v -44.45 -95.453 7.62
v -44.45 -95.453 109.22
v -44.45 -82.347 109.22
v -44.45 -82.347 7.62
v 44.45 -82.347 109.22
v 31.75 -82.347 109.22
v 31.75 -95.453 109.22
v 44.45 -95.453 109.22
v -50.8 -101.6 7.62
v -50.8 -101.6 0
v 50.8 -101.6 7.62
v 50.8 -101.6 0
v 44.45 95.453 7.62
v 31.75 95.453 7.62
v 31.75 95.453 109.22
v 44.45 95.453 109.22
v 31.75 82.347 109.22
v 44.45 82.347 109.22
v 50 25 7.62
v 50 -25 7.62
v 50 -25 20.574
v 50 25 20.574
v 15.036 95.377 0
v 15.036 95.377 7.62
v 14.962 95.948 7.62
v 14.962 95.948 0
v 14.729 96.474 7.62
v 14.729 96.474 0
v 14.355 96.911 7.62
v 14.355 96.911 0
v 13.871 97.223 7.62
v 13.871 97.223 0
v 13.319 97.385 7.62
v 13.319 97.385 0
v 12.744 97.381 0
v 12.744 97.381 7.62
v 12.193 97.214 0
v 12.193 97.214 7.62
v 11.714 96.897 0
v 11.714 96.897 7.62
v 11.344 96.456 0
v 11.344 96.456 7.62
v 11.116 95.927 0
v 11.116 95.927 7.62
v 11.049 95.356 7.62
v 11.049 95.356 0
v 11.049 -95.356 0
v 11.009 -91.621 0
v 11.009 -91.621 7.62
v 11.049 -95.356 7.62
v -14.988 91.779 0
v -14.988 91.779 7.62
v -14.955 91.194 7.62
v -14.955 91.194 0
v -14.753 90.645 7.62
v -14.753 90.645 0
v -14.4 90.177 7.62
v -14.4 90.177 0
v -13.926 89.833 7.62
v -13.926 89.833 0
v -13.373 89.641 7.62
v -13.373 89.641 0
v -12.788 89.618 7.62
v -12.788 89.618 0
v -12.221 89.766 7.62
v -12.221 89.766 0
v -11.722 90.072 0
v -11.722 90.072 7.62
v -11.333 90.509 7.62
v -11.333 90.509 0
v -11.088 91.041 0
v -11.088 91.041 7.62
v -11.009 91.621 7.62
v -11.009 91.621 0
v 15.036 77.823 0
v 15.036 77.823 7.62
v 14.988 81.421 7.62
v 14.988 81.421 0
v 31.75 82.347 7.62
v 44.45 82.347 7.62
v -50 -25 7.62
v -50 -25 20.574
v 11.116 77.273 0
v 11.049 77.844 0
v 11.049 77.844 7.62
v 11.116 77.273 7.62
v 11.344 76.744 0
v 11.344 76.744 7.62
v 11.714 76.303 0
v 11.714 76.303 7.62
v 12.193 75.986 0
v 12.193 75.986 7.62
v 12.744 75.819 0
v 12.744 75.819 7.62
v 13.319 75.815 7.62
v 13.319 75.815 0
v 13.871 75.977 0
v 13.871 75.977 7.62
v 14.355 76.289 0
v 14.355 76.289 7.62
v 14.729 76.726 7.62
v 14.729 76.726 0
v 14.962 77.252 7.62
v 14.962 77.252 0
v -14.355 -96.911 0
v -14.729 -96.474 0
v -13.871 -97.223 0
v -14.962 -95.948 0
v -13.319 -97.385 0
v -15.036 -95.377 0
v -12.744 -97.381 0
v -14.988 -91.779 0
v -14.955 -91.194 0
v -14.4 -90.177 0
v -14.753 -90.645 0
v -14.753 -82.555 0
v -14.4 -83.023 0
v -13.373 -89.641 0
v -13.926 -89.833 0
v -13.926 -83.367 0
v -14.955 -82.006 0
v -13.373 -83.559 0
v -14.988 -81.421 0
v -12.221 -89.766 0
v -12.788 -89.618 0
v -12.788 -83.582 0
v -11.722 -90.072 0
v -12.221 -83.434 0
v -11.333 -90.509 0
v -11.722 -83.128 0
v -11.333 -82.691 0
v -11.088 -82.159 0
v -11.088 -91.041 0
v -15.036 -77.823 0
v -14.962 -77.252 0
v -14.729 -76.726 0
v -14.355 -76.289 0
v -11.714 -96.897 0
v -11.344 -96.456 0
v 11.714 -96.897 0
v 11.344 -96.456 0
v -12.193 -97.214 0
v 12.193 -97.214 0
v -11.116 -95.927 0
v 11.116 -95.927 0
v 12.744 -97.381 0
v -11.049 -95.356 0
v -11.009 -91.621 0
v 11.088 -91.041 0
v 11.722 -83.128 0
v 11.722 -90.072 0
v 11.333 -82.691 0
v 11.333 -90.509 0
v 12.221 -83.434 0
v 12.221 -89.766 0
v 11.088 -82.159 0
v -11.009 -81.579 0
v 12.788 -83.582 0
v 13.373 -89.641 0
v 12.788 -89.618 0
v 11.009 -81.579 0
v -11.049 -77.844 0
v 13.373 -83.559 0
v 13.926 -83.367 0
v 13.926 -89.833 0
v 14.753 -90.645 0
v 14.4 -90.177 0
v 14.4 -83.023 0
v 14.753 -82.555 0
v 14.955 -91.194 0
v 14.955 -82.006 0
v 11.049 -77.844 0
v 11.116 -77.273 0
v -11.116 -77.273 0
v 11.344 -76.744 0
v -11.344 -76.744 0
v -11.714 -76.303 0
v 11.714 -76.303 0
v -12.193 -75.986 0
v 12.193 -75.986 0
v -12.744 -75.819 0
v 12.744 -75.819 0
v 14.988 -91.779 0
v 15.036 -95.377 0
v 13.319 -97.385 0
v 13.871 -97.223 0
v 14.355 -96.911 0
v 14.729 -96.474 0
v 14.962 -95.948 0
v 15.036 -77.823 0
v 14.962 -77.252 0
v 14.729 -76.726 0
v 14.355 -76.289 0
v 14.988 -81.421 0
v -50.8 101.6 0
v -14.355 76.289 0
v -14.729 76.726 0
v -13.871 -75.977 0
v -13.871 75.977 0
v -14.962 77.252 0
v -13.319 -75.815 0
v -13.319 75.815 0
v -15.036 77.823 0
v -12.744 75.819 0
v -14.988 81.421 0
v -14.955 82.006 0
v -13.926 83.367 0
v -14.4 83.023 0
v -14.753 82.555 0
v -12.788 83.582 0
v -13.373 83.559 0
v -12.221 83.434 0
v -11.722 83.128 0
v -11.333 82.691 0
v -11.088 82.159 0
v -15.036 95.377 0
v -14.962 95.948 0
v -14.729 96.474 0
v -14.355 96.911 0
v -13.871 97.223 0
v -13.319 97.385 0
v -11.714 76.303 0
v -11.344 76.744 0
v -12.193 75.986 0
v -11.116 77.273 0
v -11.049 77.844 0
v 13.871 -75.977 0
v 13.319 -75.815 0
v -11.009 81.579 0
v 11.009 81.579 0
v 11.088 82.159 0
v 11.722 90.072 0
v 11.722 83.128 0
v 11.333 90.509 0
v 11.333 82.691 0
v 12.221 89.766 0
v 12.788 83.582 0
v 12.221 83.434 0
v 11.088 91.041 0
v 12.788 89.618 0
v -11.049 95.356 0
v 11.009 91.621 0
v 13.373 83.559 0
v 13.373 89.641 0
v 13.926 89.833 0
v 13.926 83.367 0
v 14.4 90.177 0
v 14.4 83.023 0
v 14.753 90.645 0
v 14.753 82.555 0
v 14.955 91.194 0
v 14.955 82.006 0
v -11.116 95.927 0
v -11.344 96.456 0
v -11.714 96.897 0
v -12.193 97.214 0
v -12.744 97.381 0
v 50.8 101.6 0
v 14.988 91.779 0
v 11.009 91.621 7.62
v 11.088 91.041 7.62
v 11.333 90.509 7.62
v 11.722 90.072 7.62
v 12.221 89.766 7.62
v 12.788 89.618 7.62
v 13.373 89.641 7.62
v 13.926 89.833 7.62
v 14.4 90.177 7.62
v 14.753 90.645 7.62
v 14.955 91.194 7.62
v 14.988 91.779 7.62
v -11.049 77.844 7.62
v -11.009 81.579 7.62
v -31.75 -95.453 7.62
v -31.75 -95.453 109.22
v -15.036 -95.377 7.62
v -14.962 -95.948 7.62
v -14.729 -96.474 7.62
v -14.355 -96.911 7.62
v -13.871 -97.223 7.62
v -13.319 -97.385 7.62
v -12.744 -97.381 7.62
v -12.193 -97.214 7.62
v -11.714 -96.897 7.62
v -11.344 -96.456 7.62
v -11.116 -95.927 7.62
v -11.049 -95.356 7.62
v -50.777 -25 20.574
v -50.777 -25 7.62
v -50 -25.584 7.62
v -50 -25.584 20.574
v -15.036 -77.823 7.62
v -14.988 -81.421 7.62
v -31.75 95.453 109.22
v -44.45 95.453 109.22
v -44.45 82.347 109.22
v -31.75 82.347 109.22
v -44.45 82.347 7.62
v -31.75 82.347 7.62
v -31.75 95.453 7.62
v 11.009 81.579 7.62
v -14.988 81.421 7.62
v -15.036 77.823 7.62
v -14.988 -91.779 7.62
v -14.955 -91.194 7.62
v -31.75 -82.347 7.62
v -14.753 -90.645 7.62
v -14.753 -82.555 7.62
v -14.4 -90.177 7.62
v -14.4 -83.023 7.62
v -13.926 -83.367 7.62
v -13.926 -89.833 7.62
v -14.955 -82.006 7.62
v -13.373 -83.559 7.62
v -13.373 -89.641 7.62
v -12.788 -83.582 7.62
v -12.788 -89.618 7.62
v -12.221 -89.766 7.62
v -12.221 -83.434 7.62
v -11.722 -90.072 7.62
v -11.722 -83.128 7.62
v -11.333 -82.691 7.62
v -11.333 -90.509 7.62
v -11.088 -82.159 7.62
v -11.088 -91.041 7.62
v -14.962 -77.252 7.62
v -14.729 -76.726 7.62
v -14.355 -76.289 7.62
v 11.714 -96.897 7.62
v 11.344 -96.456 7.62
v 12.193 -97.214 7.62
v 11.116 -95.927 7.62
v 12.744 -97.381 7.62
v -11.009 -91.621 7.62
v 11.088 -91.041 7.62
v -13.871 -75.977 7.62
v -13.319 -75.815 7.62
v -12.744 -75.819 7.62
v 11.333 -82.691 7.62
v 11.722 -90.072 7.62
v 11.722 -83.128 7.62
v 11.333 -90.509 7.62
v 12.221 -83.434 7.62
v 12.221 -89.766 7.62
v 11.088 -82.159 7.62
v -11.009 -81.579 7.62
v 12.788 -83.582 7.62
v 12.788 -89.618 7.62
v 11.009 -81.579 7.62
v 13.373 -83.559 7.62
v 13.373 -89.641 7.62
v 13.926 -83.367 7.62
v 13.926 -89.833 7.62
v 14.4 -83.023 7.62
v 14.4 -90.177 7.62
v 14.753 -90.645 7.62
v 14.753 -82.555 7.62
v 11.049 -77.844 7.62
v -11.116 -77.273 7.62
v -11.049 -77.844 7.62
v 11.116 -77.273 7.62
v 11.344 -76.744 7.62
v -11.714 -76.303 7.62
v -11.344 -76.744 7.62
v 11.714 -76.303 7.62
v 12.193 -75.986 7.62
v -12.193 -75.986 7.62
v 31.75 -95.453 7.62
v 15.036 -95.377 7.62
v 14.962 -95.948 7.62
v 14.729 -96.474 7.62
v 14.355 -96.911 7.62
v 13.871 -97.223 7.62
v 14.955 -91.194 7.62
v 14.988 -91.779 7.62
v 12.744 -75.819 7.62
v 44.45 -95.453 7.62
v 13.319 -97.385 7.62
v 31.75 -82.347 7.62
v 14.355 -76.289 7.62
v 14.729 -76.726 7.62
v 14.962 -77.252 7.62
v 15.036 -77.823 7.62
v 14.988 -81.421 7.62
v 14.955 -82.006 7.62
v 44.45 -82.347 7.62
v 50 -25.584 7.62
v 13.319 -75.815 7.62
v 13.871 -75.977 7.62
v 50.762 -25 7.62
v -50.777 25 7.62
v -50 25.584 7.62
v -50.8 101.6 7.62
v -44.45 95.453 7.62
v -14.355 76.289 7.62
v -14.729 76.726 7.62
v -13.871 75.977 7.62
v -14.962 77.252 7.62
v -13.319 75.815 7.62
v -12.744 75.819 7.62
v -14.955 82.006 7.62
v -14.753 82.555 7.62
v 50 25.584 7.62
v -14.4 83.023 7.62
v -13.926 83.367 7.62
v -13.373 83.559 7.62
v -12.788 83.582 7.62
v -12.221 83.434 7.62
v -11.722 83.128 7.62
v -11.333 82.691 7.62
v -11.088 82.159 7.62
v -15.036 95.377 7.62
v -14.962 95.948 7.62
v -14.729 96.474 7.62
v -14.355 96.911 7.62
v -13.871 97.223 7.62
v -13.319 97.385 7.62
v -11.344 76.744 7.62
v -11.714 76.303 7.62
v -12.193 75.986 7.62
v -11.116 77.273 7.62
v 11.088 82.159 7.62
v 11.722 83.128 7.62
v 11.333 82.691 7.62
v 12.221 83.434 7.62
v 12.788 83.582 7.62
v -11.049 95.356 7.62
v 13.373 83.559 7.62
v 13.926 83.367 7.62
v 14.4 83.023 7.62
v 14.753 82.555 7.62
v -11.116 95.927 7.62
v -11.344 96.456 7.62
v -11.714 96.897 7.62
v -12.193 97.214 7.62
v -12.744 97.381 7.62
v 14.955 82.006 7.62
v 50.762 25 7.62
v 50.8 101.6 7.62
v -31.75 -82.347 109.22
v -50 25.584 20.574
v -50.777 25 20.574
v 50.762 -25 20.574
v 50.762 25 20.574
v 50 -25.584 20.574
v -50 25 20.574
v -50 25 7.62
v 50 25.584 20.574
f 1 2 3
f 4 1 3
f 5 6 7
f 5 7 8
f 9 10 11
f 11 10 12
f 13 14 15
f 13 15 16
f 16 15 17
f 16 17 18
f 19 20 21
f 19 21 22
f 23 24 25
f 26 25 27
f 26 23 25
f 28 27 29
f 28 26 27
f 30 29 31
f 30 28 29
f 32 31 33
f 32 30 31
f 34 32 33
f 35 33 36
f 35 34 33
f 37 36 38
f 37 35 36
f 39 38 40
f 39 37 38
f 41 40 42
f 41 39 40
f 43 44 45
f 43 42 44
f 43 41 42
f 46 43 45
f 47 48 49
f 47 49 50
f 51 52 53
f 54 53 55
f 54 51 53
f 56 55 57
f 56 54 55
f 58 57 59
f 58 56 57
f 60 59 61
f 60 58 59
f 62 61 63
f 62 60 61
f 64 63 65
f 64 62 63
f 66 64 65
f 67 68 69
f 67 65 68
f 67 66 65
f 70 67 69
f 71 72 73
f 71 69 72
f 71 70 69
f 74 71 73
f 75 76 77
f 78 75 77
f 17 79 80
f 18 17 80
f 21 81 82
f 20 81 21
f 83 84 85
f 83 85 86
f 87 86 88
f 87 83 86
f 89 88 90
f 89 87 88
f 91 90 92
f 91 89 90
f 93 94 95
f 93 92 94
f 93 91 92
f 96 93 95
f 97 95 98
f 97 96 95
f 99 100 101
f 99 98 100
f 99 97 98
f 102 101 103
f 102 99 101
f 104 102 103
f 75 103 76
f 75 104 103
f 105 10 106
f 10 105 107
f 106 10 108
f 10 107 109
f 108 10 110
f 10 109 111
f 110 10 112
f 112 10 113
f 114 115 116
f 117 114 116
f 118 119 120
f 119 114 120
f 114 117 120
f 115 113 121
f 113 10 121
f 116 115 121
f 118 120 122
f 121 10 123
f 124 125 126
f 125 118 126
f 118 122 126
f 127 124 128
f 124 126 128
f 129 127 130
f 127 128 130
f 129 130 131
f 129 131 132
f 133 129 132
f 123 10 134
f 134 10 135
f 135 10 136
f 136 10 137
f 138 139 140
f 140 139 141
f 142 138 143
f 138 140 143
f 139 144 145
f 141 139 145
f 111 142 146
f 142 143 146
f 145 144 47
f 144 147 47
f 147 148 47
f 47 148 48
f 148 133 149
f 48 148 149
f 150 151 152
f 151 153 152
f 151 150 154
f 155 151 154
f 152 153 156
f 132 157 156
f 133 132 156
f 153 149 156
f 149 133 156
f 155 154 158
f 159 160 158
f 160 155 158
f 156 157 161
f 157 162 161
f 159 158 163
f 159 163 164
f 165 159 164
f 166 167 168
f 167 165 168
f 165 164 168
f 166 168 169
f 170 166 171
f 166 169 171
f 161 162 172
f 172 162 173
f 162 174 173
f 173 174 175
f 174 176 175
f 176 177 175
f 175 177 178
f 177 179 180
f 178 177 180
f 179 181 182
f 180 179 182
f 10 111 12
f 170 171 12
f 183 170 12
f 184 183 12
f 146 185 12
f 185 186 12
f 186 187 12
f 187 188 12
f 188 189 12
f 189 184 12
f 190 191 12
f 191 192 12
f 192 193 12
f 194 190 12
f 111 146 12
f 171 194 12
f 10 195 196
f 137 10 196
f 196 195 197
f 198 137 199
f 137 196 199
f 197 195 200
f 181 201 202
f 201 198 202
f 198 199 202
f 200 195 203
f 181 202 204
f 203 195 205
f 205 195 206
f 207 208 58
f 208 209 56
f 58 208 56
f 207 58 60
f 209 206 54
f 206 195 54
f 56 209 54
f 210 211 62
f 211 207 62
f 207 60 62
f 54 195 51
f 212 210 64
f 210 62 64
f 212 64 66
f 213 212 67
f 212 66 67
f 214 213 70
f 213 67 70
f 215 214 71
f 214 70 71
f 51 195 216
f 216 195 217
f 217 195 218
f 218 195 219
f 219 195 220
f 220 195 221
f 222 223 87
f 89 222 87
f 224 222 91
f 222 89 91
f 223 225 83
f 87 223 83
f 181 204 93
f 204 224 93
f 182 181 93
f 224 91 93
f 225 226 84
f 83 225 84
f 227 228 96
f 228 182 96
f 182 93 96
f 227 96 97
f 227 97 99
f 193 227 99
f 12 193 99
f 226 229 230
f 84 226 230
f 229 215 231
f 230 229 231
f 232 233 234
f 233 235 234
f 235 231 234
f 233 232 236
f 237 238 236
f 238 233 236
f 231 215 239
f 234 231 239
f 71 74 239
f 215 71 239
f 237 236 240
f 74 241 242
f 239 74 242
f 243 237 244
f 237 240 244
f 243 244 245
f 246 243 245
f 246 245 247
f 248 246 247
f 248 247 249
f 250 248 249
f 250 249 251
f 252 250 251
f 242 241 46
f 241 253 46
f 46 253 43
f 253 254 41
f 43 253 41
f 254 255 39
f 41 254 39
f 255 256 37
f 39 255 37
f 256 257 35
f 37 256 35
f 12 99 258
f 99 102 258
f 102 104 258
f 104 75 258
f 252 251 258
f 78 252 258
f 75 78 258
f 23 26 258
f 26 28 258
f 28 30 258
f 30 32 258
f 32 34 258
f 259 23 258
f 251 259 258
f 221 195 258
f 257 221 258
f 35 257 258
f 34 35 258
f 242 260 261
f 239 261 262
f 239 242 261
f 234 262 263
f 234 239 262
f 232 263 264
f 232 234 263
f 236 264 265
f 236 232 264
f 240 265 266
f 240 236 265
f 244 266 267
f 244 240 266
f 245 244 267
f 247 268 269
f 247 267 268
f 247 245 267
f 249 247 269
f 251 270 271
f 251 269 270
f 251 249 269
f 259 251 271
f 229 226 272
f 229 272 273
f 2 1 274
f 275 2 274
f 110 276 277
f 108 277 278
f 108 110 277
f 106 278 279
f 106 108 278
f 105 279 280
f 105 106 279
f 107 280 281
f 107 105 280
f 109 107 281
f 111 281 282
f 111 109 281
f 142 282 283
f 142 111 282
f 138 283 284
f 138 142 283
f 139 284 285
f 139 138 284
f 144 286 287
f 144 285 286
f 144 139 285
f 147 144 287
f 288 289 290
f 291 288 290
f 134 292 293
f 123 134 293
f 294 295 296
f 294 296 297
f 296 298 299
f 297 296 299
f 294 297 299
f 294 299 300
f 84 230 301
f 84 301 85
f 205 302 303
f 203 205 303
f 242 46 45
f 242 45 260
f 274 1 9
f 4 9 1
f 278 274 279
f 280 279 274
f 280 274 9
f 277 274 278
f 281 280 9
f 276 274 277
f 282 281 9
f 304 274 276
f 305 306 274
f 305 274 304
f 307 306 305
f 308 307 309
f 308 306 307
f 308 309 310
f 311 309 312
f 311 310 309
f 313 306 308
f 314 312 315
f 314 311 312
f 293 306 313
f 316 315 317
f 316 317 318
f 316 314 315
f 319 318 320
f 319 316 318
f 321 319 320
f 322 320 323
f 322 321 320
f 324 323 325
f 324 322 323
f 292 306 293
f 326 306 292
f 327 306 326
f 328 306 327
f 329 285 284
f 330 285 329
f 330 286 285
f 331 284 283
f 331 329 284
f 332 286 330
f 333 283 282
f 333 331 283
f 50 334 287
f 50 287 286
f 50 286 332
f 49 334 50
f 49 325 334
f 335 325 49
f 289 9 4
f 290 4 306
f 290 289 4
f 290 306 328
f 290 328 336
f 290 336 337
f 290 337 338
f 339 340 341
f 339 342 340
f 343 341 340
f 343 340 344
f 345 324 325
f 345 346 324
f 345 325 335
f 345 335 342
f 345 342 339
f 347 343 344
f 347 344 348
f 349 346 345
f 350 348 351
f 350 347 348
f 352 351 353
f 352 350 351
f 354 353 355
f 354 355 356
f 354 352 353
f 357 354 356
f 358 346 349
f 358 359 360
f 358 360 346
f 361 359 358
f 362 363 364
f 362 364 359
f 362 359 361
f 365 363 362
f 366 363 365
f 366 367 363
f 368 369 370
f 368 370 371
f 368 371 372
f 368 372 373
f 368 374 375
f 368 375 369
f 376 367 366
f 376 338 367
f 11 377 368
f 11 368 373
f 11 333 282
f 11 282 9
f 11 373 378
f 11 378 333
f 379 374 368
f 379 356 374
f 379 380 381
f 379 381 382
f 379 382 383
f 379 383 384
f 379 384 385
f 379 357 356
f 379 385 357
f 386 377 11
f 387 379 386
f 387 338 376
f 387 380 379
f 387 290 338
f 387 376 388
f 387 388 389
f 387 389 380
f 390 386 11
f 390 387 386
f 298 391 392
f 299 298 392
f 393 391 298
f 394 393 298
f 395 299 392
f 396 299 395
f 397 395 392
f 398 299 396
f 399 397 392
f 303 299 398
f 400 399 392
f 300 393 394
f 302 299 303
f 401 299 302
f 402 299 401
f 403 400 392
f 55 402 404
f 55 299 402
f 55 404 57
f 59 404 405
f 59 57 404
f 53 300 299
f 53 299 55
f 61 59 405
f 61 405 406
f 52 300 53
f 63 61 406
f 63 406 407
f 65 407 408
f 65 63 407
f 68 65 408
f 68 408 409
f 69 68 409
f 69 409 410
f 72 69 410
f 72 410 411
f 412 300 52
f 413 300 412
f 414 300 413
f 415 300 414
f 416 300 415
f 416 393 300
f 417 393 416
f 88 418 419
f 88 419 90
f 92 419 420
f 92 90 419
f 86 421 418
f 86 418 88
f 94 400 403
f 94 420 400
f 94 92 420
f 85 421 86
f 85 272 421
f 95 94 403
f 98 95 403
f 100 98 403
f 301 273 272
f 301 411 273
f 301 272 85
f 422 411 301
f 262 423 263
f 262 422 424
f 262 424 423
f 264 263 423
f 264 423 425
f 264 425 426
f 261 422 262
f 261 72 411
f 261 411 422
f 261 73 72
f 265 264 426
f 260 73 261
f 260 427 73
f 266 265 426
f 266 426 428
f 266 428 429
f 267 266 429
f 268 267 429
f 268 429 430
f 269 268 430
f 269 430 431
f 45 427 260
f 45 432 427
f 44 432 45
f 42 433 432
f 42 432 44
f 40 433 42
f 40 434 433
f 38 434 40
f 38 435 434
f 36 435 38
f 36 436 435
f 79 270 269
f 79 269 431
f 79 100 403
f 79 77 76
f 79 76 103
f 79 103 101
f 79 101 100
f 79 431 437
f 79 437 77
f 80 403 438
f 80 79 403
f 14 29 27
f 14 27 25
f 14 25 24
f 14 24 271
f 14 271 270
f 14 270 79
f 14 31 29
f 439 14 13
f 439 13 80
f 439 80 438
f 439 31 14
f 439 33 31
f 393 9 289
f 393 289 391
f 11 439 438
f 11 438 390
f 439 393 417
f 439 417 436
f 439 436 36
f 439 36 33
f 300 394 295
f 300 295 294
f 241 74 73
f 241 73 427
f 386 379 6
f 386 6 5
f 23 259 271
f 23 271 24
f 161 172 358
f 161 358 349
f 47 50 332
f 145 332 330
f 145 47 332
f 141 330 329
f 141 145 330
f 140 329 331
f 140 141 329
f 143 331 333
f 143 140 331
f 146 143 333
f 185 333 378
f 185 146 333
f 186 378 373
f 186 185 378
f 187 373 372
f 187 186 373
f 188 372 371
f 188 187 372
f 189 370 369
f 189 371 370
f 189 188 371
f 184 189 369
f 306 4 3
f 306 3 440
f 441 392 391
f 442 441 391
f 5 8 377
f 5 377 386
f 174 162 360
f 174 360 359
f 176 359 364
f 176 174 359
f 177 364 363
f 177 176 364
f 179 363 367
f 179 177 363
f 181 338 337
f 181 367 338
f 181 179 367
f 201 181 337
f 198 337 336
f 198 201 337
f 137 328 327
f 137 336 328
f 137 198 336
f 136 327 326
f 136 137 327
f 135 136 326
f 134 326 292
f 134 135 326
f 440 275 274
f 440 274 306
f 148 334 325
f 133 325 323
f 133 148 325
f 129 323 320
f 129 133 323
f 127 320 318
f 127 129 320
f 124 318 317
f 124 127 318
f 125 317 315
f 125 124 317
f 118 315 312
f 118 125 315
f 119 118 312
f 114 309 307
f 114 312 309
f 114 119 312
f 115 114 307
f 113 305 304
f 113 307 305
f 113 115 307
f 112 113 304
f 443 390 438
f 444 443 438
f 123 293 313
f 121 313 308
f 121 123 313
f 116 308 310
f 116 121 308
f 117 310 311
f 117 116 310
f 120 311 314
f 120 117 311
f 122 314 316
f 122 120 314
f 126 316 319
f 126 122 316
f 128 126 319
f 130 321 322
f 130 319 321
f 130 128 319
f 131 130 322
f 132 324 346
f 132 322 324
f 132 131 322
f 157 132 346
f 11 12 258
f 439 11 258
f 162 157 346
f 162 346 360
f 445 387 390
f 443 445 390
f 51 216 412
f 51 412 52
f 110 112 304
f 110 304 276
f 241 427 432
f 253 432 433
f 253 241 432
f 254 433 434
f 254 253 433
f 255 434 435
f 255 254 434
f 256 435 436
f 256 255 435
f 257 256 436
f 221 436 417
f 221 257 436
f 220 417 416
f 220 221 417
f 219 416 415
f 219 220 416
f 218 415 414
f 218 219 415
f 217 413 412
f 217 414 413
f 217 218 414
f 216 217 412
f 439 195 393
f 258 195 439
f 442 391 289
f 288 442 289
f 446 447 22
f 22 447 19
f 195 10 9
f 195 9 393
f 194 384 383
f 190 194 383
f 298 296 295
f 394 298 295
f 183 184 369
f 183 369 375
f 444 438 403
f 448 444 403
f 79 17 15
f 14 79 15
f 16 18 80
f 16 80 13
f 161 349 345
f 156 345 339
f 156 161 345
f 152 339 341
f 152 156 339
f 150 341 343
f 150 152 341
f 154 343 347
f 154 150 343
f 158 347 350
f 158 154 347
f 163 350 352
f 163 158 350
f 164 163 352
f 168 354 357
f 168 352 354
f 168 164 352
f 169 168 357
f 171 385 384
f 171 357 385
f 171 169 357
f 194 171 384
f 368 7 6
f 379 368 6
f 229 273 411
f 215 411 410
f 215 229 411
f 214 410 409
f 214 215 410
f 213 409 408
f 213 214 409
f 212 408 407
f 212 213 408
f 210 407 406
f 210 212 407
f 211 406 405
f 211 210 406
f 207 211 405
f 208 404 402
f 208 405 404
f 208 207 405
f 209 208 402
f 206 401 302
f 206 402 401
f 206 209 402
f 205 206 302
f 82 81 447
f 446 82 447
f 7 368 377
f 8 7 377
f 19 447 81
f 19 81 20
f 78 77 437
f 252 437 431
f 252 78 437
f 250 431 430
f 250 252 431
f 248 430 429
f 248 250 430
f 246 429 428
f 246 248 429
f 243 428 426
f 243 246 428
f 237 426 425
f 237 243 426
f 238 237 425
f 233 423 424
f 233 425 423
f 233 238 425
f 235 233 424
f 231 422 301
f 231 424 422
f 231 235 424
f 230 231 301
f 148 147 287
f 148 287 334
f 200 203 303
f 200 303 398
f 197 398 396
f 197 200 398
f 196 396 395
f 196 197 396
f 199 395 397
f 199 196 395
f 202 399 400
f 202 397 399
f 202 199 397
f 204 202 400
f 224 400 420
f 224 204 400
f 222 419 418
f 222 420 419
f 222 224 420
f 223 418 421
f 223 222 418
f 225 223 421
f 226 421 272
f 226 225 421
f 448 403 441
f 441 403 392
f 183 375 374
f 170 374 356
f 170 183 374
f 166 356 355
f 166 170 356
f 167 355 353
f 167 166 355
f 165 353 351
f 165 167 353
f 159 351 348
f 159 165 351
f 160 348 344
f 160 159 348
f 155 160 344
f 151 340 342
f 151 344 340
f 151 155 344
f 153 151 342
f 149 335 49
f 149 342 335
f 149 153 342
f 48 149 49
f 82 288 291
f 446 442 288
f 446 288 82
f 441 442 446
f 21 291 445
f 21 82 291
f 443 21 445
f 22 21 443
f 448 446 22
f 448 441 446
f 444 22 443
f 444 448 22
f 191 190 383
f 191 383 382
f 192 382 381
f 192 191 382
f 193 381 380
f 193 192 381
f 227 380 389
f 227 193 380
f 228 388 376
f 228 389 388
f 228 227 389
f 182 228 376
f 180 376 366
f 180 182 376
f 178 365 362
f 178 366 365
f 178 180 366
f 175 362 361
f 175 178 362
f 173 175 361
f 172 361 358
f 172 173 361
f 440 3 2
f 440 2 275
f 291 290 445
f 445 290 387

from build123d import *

# Parameters (mm, degrees)
F0_W     = 101.6
F0_H     = 203.2
F1_DEPTH = 7.62
F3_DEPTH = 25.4
F4_W     = 12.7
F4_H     = 13.10565
F5_DEPTH = 101.6
F6_W     = 100
F6_H     = 50
F7_DEPTH = 12.954


with BuildPart() as f1:
    # F0 (on Top) → F1 (new body)
    with BuildSketch(Plane.XY):
        Rectangle(F0_W, F0_H)
    extrude(amount=F1_DEPTH)

    # F2 (on Top) → F3 (cut)
    with BuildSketch(Plane.XY):
        with BuildLine():
            Line((-15.035691, -77.822713), (-14.988321, -81.421245))
            ThreePointArc((-14.988321, -81.421245), (-13.081192, -83.592345), (-11.008666, -81.578528))
            Line((-11.008666, -81.578528), (-11.048887, -77.843856))
            ThreePointArc((-11.048887, -77.843856), (-13.031485, -75.796128), (-15.035691, -77.822713))
        make_face()
        with BuildLine():
            ThreePointArc((-15.035691, -95.377287), (-13.031485, -97.403872), (-11.048887, -95.356144))
            Line((-11.048887, -95.356144), (-11.008666, -91.621472))
            ThreePointArc((-11.008666, -91.621472), (-13.081192, -89.607655), (-14.988321, -91.778755))
            Line((-14.988321, -91.778755), (-15.035691, -95.377287))
        make_face()
        with BuildLine():
            ThreePointArc((15.035691, -77.822713), (13.031485, -75.796128), (11.048887, -77.843856))
            Line((11.048887, -77.843856), (11.008666, -81.578528))
            ThreePointArc((11.008666, -81.578528), (13.081192, -83.592345), (14.988321, -81.421245))
            Line((14.988321, -81.421245), (15.035691, -77.822713))
        make_face()
        with BuildLine():
            Line((11.008666, -91.621472), (11.048887, -95.356144))
            ThreePointArc((11.048887, -95.356144), (13.031485, -97.403872), (15.035691, -95.377287))
            Line((15.035691, -95.377287), (14.988321, -91.778755))
            ThreePointArc((14.988321, -91.778755), (13.081192, -89.607655), (11.008666, -91.621472))
        make_face()
        with BuildLine():
            ThreePointArc((15.035691, 95.377287), (13.031485, 97.403872), (11.048887, 95.356144))
            Line((11.048887, 95.356144), (11.008666, 91.621472))
            ThreePointArc((11.008666, 91.621472), (13.081192, 89.607655), (14.988321, 91.778755))
            Line((14.988321, 91.778755), (15.035691, 95.377287))
        make_face()
        with BuildLine():
            Line((-11.008666, 91.621472), (-11.048887, 95.356144))
            ThreePointArc((-11.048887, 95.356144), (-13.031485, 97.403872), (-15.035691, 95.377287))
            Line((-15.035691, 95.377287), (-14.988321, 91.778755))
            ThreePointArc((-14.988321, 91.778755), (-13.081192, 89.607655), (-11.008666, 91.621472))
        make_face()
        with BuildLine():
            ThreePointArc((-15.035691, 77.822713), (-13.031485, 75.796128), (-11.048887, 77.843856))
            Line((-11.048887, 77.843856), (-11.008666, 81.578528))
            ThreePointArc((-11.008666, 81.578528), (-13.081192, 83.592345), (-14.988321, 81.421245))
            Line((-14.988321, 81.421245), (-15.035691, 77.822713))
        make_face()
        with BuildLine():
            ThreePointArc((11.048887, 77.843856), (13.031485, 75.796128), (15.035691, 77.822713))
            Line((15.035691, 77.822713), (14.988321, 81.421245))
            ThreePointArc((14.988321, 81.421245), (13.081192, 83.592345), (11.008666, 81.578528))
            Line((11.008666, 81.578528), (11.048887, 77.843856))
        make_face()
    extrude(amount=F3_DEPTH, mode=Mode.SUBTRACT)

    # F4 (on face) → F5 (join)
    with BuildSketch(Plane.XY.offset(7.62)):
        with Locations((38.1, 88.9)):
            Rectangle(F4_W, F4_H)
        with Locations((-38.1, 88.9)):
            Rectangle(F4_W, F4_H)
        with Locations((38.1, -88.9)):
            Rectangle(F4_W, F4_H)
        with Locations((-38.1, -88.9)):
            Rectangle(F4_W, F4_H)
    extrude(amount=F5_DEPTH)

    # F6 (on face) → F7 (join)
    with BuildSketch(Plane.XY.offset(7.62)):
        Polygon((50, 25.5842), (-50, 25.5842), (-50.777242, 25), (-50.777242, -25), (-50, -25.5842), (50, -25.5842), (50.762001, -25), (50.762001, 25), align=None)
        Rectangle(F6_W, F6_H, mode=Mode.SUBTRACT)
    extrude(amount=F7_DEPTH)


solid = f1.part
